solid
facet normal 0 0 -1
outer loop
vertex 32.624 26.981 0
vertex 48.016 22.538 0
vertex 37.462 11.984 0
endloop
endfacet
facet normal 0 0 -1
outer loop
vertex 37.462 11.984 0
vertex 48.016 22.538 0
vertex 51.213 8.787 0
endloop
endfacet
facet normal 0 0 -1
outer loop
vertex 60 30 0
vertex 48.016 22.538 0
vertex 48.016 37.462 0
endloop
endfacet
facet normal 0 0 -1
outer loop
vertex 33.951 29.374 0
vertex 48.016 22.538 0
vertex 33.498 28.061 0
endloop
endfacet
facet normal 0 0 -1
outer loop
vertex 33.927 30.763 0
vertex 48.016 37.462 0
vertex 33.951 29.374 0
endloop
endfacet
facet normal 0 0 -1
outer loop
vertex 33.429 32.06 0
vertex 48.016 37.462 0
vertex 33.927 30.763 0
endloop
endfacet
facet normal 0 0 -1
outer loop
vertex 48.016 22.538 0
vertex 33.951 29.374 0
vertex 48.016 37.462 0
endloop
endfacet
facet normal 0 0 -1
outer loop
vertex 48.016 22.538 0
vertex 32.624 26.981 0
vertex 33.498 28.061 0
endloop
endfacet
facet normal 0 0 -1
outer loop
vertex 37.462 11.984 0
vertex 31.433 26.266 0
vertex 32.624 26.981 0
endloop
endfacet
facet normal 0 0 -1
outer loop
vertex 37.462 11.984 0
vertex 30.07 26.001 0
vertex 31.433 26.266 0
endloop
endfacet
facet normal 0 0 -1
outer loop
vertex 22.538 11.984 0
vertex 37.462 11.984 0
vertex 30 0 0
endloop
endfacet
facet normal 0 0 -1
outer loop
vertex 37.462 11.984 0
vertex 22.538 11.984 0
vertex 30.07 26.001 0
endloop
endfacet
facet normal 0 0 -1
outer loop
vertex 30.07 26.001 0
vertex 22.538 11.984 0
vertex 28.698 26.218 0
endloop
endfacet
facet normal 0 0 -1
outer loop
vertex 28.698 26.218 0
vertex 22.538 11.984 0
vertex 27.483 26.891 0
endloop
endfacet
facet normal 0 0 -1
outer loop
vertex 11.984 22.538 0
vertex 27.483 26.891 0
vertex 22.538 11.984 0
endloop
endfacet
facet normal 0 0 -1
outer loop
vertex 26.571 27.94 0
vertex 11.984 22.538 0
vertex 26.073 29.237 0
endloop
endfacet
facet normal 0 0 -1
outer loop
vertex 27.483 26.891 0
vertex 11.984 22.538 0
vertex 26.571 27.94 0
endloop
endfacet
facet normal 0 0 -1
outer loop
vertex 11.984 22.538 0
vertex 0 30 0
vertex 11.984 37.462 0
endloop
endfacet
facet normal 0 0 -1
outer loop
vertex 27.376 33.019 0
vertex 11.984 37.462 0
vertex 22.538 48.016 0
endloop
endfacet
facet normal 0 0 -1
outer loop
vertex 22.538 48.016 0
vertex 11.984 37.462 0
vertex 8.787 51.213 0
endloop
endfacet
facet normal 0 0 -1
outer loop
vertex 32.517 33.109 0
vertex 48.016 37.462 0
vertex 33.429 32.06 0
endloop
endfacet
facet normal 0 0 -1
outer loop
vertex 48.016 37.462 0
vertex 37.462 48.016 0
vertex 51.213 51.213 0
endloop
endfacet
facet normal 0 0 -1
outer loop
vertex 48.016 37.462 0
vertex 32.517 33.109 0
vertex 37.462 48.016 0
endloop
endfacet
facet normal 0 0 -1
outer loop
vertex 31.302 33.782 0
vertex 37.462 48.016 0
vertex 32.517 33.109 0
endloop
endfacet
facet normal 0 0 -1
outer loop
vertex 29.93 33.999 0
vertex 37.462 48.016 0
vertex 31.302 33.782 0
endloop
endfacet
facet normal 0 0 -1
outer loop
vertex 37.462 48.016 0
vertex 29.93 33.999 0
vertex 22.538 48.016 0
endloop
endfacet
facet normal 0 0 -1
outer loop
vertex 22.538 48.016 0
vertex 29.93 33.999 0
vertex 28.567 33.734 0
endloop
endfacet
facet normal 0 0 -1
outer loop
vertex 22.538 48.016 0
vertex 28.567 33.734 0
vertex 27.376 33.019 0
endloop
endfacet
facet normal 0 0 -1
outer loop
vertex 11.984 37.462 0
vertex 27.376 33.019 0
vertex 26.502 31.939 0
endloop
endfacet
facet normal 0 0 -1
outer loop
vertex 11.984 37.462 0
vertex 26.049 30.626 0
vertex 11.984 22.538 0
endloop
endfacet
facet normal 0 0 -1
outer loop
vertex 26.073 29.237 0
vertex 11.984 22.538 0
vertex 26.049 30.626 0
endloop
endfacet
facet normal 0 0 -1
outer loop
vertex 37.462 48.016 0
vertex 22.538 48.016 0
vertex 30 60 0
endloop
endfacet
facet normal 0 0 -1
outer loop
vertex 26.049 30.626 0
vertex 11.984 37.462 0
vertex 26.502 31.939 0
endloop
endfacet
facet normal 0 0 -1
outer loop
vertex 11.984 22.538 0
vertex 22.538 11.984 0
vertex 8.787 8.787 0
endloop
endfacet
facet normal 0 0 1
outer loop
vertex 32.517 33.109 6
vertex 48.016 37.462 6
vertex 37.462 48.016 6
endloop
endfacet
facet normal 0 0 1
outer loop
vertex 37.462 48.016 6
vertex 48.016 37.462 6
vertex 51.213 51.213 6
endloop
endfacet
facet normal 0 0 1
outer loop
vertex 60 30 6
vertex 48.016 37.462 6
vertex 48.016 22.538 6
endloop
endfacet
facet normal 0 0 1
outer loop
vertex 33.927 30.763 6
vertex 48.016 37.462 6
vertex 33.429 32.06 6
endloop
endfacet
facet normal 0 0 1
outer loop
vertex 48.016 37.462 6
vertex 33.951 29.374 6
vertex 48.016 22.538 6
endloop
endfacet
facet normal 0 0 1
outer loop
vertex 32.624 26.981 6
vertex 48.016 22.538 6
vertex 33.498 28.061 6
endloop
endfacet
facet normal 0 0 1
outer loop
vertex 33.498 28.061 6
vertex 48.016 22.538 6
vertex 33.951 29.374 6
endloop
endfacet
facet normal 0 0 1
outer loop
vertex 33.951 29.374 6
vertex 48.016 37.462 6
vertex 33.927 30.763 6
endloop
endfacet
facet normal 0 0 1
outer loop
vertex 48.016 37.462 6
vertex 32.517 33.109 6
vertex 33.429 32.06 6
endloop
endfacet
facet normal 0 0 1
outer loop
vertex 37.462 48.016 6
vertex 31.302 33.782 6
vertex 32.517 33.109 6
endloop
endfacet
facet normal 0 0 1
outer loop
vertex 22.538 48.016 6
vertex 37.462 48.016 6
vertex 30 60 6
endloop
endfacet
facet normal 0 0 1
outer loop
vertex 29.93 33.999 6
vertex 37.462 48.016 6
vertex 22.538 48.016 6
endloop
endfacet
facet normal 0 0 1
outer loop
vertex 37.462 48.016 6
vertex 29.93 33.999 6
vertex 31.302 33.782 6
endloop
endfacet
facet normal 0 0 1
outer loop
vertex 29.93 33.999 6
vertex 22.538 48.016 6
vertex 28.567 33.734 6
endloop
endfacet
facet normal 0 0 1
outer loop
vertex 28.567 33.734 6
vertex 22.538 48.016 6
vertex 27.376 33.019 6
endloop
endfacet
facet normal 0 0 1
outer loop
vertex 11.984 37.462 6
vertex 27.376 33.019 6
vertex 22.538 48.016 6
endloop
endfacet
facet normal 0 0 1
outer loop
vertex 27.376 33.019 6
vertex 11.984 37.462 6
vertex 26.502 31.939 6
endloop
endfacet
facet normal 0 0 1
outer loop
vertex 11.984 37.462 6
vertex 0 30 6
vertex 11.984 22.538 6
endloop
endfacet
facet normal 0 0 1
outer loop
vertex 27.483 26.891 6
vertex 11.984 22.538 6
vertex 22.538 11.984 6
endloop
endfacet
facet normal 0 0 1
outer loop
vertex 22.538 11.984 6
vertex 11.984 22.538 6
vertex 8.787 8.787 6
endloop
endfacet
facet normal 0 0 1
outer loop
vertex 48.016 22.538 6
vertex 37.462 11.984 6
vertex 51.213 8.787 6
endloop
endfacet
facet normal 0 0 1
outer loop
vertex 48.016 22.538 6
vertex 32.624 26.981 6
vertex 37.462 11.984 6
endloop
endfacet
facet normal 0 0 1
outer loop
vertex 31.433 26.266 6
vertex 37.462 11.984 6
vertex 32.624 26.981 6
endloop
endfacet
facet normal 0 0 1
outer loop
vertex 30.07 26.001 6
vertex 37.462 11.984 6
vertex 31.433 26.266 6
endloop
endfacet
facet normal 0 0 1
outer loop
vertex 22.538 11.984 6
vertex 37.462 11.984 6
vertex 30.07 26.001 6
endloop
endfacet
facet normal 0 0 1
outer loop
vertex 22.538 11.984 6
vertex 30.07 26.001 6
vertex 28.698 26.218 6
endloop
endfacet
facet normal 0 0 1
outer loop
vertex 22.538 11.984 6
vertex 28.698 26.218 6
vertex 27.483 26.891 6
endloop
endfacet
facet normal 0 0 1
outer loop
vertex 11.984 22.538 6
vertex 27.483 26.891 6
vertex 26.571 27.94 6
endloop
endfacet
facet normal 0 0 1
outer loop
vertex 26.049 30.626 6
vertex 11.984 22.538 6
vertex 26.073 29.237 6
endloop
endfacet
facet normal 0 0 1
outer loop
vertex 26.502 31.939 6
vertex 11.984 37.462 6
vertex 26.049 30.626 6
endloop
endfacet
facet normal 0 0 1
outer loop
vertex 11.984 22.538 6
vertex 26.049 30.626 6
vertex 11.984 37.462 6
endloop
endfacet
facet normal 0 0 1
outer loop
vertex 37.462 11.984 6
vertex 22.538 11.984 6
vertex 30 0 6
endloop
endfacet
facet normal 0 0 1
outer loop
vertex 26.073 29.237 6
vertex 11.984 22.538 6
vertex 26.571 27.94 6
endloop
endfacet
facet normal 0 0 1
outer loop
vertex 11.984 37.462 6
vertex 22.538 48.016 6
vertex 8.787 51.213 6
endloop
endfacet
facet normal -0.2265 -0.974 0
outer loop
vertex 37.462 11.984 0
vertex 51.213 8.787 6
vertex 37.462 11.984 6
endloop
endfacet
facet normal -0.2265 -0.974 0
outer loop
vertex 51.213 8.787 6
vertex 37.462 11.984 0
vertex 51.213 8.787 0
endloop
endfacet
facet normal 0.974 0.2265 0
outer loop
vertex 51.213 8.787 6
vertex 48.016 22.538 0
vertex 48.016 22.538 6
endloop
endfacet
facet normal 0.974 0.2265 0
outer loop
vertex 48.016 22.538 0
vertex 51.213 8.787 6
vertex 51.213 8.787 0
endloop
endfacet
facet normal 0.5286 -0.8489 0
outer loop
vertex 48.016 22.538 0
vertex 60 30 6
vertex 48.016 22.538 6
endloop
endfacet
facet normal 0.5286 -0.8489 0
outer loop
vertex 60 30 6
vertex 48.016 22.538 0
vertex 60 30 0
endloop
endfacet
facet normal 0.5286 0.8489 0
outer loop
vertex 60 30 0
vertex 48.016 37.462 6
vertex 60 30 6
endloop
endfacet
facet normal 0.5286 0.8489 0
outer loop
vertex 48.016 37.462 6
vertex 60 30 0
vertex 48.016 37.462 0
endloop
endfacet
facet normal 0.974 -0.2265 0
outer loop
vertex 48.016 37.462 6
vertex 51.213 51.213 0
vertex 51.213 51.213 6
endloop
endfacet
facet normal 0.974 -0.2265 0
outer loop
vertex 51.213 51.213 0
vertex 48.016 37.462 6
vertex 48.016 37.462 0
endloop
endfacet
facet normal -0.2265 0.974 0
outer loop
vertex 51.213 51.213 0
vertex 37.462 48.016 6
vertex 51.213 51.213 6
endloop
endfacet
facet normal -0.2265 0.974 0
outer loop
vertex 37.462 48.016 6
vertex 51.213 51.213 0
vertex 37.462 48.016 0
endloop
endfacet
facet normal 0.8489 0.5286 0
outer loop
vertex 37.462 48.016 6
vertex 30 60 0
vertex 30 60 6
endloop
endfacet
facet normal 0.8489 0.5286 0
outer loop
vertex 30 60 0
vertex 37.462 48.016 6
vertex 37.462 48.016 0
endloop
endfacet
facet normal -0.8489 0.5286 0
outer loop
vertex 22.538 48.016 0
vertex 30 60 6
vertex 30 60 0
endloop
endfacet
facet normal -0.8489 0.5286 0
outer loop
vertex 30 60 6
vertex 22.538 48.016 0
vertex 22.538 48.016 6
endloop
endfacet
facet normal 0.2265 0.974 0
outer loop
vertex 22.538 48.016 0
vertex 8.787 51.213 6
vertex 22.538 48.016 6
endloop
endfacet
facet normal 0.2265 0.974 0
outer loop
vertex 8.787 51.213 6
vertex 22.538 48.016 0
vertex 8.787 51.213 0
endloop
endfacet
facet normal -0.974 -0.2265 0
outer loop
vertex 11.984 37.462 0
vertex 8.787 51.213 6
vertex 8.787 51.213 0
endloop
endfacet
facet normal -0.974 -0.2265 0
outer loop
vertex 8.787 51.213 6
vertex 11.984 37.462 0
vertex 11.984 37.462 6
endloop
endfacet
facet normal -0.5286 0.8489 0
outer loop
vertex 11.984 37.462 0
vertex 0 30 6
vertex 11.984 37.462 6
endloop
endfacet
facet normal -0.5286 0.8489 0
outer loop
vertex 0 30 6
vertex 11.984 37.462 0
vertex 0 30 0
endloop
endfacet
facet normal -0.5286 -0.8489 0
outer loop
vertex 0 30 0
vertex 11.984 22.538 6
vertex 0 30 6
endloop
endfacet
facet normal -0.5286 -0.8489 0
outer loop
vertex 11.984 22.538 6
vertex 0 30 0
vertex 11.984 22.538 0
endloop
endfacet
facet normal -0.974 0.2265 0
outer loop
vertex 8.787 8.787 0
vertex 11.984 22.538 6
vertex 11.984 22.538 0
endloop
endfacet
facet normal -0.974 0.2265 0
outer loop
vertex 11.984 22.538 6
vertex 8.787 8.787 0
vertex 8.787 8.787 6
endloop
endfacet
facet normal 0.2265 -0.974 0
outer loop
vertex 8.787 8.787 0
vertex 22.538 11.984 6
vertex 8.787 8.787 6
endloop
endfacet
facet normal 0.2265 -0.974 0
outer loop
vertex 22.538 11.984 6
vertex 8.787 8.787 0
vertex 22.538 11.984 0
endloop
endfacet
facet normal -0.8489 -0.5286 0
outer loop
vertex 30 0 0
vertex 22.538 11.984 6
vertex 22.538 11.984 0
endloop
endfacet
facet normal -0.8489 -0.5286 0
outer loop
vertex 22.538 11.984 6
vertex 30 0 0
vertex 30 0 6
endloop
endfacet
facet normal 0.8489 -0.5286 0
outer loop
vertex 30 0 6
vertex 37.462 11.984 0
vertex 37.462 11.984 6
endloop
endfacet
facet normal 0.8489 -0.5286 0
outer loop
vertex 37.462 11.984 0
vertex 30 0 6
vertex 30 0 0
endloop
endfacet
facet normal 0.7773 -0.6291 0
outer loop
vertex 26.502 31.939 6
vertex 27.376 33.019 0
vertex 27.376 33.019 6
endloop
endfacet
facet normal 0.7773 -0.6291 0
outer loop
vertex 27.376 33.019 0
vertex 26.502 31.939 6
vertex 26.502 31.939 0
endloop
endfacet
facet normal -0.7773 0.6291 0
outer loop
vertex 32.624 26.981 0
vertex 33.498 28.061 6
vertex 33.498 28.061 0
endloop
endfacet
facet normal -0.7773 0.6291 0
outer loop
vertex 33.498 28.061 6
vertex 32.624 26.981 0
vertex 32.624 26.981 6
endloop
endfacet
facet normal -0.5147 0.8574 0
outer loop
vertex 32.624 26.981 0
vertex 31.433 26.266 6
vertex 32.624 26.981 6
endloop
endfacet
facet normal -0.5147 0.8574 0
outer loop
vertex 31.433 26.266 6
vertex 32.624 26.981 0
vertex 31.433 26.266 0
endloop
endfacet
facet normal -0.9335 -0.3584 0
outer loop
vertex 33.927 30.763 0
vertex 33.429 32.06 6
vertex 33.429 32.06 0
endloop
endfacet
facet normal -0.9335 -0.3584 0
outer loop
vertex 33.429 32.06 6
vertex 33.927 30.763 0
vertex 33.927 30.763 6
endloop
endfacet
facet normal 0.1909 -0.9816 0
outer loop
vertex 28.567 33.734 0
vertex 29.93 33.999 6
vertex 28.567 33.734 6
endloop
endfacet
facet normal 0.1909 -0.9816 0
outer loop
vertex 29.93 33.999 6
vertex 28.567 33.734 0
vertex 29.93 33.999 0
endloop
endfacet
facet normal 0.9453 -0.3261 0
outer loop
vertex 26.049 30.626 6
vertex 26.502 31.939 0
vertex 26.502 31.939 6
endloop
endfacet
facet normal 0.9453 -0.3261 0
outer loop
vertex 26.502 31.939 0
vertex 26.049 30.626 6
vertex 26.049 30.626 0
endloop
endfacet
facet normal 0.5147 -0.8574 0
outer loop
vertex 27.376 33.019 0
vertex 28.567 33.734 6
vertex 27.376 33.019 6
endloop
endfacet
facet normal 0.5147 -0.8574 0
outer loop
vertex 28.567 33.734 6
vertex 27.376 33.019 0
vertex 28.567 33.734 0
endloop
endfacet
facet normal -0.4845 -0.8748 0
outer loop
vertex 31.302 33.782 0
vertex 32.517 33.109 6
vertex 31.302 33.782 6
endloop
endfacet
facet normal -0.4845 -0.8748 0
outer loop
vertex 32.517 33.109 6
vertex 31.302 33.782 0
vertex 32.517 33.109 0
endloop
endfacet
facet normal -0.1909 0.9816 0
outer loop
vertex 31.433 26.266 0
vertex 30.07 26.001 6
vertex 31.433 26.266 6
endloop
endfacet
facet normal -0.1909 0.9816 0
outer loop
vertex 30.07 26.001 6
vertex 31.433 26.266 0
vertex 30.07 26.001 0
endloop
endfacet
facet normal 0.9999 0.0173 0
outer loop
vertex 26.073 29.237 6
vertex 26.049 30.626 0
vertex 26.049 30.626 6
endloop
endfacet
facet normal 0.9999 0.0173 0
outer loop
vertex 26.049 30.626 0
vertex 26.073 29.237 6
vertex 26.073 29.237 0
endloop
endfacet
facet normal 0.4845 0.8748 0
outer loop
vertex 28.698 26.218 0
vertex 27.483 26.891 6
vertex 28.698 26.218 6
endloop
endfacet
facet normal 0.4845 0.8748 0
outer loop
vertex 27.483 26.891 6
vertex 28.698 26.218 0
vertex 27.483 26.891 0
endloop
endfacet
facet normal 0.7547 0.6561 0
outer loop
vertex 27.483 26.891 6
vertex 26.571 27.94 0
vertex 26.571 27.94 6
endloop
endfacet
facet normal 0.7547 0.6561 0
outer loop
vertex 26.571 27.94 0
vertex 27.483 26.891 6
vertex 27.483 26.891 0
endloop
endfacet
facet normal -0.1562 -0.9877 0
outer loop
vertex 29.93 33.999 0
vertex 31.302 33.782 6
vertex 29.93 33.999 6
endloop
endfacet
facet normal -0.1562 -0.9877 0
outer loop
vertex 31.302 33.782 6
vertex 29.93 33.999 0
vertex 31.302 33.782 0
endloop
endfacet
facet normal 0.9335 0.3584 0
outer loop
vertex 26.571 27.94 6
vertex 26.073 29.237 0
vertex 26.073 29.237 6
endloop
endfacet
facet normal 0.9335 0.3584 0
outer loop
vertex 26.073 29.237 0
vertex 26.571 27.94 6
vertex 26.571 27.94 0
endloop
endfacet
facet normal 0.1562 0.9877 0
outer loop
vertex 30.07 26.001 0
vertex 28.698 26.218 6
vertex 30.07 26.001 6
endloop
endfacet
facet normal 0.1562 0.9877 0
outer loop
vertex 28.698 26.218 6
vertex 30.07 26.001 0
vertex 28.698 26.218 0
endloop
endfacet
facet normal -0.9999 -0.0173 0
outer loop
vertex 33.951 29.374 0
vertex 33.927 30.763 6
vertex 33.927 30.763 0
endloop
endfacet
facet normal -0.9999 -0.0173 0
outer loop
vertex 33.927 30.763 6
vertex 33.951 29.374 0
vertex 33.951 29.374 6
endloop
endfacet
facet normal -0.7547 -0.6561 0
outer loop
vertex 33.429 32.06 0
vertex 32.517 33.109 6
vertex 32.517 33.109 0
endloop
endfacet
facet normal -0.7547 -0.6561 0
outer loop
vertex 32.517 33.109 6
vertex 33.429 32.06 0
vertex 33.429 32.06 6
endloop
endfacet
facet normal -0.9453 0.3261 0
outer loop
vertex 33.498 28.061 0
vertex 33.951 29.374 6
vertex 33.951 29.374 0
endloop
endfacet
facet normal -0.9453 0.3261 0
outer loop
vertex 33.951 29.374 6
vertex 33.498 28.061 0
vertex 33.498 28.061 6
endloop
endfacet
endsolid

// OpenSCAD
$fn = 32;

// ----------------------------------------------------------------------
// Star wheel: 8-point blunt, R30
// ----------------------------------------------------------------------

// --- parameters (mm) ---
n_points = 8;             // number of points / teeth
r_out = 30;               // tip radius
r_in = 19.5;              // root radius
bore_r = 4;               // centre bore radius
plate_t = 6;              // plate thickness, Z (extrusion height)
bore_d = 8;               // centre bore diameter

profile = [[0, 30], [11.984, 22.538], [8.787, 8.787], [22.538, 11.984], [30, 0], [37.462, 11.984], [51.213, 8.787], [48.016, 22.538], [60, 30], [48.016, 37.462], [51.213, 51.213], [37.462, 48.016], [30, 60], [22.538, 48.016], [8.787, 51.213], [11.984, 37.462]];  // primary outline, 16 points, counter clockwise
void_1 = [[33.927, 30.763], [33.429, 32.06], [32.517, 33.109], [31.302, 33.782], [29.93, 33.999], [28.567, 33.734], [27.376, 33.019], [26.502, 31.939], [26.049, 30.626], [26.073, 29.237], [26.571, 27.94], [27.483, 26.891], [28.698, 26.218], [30.07, 26.001], [31.433, 26.266], [32.624, 26.981], [33.498, 28.061], [33.951, 29.374]];  // centre bore, 18 points

// --- the one profile operation ---
difference() {
  linear_extrude(height = plate_t) polygon(points = profile);
  translate([0, 0, -1])
    linear_extrude(height = plate_t + 2) polygon(points = void_1);
}
